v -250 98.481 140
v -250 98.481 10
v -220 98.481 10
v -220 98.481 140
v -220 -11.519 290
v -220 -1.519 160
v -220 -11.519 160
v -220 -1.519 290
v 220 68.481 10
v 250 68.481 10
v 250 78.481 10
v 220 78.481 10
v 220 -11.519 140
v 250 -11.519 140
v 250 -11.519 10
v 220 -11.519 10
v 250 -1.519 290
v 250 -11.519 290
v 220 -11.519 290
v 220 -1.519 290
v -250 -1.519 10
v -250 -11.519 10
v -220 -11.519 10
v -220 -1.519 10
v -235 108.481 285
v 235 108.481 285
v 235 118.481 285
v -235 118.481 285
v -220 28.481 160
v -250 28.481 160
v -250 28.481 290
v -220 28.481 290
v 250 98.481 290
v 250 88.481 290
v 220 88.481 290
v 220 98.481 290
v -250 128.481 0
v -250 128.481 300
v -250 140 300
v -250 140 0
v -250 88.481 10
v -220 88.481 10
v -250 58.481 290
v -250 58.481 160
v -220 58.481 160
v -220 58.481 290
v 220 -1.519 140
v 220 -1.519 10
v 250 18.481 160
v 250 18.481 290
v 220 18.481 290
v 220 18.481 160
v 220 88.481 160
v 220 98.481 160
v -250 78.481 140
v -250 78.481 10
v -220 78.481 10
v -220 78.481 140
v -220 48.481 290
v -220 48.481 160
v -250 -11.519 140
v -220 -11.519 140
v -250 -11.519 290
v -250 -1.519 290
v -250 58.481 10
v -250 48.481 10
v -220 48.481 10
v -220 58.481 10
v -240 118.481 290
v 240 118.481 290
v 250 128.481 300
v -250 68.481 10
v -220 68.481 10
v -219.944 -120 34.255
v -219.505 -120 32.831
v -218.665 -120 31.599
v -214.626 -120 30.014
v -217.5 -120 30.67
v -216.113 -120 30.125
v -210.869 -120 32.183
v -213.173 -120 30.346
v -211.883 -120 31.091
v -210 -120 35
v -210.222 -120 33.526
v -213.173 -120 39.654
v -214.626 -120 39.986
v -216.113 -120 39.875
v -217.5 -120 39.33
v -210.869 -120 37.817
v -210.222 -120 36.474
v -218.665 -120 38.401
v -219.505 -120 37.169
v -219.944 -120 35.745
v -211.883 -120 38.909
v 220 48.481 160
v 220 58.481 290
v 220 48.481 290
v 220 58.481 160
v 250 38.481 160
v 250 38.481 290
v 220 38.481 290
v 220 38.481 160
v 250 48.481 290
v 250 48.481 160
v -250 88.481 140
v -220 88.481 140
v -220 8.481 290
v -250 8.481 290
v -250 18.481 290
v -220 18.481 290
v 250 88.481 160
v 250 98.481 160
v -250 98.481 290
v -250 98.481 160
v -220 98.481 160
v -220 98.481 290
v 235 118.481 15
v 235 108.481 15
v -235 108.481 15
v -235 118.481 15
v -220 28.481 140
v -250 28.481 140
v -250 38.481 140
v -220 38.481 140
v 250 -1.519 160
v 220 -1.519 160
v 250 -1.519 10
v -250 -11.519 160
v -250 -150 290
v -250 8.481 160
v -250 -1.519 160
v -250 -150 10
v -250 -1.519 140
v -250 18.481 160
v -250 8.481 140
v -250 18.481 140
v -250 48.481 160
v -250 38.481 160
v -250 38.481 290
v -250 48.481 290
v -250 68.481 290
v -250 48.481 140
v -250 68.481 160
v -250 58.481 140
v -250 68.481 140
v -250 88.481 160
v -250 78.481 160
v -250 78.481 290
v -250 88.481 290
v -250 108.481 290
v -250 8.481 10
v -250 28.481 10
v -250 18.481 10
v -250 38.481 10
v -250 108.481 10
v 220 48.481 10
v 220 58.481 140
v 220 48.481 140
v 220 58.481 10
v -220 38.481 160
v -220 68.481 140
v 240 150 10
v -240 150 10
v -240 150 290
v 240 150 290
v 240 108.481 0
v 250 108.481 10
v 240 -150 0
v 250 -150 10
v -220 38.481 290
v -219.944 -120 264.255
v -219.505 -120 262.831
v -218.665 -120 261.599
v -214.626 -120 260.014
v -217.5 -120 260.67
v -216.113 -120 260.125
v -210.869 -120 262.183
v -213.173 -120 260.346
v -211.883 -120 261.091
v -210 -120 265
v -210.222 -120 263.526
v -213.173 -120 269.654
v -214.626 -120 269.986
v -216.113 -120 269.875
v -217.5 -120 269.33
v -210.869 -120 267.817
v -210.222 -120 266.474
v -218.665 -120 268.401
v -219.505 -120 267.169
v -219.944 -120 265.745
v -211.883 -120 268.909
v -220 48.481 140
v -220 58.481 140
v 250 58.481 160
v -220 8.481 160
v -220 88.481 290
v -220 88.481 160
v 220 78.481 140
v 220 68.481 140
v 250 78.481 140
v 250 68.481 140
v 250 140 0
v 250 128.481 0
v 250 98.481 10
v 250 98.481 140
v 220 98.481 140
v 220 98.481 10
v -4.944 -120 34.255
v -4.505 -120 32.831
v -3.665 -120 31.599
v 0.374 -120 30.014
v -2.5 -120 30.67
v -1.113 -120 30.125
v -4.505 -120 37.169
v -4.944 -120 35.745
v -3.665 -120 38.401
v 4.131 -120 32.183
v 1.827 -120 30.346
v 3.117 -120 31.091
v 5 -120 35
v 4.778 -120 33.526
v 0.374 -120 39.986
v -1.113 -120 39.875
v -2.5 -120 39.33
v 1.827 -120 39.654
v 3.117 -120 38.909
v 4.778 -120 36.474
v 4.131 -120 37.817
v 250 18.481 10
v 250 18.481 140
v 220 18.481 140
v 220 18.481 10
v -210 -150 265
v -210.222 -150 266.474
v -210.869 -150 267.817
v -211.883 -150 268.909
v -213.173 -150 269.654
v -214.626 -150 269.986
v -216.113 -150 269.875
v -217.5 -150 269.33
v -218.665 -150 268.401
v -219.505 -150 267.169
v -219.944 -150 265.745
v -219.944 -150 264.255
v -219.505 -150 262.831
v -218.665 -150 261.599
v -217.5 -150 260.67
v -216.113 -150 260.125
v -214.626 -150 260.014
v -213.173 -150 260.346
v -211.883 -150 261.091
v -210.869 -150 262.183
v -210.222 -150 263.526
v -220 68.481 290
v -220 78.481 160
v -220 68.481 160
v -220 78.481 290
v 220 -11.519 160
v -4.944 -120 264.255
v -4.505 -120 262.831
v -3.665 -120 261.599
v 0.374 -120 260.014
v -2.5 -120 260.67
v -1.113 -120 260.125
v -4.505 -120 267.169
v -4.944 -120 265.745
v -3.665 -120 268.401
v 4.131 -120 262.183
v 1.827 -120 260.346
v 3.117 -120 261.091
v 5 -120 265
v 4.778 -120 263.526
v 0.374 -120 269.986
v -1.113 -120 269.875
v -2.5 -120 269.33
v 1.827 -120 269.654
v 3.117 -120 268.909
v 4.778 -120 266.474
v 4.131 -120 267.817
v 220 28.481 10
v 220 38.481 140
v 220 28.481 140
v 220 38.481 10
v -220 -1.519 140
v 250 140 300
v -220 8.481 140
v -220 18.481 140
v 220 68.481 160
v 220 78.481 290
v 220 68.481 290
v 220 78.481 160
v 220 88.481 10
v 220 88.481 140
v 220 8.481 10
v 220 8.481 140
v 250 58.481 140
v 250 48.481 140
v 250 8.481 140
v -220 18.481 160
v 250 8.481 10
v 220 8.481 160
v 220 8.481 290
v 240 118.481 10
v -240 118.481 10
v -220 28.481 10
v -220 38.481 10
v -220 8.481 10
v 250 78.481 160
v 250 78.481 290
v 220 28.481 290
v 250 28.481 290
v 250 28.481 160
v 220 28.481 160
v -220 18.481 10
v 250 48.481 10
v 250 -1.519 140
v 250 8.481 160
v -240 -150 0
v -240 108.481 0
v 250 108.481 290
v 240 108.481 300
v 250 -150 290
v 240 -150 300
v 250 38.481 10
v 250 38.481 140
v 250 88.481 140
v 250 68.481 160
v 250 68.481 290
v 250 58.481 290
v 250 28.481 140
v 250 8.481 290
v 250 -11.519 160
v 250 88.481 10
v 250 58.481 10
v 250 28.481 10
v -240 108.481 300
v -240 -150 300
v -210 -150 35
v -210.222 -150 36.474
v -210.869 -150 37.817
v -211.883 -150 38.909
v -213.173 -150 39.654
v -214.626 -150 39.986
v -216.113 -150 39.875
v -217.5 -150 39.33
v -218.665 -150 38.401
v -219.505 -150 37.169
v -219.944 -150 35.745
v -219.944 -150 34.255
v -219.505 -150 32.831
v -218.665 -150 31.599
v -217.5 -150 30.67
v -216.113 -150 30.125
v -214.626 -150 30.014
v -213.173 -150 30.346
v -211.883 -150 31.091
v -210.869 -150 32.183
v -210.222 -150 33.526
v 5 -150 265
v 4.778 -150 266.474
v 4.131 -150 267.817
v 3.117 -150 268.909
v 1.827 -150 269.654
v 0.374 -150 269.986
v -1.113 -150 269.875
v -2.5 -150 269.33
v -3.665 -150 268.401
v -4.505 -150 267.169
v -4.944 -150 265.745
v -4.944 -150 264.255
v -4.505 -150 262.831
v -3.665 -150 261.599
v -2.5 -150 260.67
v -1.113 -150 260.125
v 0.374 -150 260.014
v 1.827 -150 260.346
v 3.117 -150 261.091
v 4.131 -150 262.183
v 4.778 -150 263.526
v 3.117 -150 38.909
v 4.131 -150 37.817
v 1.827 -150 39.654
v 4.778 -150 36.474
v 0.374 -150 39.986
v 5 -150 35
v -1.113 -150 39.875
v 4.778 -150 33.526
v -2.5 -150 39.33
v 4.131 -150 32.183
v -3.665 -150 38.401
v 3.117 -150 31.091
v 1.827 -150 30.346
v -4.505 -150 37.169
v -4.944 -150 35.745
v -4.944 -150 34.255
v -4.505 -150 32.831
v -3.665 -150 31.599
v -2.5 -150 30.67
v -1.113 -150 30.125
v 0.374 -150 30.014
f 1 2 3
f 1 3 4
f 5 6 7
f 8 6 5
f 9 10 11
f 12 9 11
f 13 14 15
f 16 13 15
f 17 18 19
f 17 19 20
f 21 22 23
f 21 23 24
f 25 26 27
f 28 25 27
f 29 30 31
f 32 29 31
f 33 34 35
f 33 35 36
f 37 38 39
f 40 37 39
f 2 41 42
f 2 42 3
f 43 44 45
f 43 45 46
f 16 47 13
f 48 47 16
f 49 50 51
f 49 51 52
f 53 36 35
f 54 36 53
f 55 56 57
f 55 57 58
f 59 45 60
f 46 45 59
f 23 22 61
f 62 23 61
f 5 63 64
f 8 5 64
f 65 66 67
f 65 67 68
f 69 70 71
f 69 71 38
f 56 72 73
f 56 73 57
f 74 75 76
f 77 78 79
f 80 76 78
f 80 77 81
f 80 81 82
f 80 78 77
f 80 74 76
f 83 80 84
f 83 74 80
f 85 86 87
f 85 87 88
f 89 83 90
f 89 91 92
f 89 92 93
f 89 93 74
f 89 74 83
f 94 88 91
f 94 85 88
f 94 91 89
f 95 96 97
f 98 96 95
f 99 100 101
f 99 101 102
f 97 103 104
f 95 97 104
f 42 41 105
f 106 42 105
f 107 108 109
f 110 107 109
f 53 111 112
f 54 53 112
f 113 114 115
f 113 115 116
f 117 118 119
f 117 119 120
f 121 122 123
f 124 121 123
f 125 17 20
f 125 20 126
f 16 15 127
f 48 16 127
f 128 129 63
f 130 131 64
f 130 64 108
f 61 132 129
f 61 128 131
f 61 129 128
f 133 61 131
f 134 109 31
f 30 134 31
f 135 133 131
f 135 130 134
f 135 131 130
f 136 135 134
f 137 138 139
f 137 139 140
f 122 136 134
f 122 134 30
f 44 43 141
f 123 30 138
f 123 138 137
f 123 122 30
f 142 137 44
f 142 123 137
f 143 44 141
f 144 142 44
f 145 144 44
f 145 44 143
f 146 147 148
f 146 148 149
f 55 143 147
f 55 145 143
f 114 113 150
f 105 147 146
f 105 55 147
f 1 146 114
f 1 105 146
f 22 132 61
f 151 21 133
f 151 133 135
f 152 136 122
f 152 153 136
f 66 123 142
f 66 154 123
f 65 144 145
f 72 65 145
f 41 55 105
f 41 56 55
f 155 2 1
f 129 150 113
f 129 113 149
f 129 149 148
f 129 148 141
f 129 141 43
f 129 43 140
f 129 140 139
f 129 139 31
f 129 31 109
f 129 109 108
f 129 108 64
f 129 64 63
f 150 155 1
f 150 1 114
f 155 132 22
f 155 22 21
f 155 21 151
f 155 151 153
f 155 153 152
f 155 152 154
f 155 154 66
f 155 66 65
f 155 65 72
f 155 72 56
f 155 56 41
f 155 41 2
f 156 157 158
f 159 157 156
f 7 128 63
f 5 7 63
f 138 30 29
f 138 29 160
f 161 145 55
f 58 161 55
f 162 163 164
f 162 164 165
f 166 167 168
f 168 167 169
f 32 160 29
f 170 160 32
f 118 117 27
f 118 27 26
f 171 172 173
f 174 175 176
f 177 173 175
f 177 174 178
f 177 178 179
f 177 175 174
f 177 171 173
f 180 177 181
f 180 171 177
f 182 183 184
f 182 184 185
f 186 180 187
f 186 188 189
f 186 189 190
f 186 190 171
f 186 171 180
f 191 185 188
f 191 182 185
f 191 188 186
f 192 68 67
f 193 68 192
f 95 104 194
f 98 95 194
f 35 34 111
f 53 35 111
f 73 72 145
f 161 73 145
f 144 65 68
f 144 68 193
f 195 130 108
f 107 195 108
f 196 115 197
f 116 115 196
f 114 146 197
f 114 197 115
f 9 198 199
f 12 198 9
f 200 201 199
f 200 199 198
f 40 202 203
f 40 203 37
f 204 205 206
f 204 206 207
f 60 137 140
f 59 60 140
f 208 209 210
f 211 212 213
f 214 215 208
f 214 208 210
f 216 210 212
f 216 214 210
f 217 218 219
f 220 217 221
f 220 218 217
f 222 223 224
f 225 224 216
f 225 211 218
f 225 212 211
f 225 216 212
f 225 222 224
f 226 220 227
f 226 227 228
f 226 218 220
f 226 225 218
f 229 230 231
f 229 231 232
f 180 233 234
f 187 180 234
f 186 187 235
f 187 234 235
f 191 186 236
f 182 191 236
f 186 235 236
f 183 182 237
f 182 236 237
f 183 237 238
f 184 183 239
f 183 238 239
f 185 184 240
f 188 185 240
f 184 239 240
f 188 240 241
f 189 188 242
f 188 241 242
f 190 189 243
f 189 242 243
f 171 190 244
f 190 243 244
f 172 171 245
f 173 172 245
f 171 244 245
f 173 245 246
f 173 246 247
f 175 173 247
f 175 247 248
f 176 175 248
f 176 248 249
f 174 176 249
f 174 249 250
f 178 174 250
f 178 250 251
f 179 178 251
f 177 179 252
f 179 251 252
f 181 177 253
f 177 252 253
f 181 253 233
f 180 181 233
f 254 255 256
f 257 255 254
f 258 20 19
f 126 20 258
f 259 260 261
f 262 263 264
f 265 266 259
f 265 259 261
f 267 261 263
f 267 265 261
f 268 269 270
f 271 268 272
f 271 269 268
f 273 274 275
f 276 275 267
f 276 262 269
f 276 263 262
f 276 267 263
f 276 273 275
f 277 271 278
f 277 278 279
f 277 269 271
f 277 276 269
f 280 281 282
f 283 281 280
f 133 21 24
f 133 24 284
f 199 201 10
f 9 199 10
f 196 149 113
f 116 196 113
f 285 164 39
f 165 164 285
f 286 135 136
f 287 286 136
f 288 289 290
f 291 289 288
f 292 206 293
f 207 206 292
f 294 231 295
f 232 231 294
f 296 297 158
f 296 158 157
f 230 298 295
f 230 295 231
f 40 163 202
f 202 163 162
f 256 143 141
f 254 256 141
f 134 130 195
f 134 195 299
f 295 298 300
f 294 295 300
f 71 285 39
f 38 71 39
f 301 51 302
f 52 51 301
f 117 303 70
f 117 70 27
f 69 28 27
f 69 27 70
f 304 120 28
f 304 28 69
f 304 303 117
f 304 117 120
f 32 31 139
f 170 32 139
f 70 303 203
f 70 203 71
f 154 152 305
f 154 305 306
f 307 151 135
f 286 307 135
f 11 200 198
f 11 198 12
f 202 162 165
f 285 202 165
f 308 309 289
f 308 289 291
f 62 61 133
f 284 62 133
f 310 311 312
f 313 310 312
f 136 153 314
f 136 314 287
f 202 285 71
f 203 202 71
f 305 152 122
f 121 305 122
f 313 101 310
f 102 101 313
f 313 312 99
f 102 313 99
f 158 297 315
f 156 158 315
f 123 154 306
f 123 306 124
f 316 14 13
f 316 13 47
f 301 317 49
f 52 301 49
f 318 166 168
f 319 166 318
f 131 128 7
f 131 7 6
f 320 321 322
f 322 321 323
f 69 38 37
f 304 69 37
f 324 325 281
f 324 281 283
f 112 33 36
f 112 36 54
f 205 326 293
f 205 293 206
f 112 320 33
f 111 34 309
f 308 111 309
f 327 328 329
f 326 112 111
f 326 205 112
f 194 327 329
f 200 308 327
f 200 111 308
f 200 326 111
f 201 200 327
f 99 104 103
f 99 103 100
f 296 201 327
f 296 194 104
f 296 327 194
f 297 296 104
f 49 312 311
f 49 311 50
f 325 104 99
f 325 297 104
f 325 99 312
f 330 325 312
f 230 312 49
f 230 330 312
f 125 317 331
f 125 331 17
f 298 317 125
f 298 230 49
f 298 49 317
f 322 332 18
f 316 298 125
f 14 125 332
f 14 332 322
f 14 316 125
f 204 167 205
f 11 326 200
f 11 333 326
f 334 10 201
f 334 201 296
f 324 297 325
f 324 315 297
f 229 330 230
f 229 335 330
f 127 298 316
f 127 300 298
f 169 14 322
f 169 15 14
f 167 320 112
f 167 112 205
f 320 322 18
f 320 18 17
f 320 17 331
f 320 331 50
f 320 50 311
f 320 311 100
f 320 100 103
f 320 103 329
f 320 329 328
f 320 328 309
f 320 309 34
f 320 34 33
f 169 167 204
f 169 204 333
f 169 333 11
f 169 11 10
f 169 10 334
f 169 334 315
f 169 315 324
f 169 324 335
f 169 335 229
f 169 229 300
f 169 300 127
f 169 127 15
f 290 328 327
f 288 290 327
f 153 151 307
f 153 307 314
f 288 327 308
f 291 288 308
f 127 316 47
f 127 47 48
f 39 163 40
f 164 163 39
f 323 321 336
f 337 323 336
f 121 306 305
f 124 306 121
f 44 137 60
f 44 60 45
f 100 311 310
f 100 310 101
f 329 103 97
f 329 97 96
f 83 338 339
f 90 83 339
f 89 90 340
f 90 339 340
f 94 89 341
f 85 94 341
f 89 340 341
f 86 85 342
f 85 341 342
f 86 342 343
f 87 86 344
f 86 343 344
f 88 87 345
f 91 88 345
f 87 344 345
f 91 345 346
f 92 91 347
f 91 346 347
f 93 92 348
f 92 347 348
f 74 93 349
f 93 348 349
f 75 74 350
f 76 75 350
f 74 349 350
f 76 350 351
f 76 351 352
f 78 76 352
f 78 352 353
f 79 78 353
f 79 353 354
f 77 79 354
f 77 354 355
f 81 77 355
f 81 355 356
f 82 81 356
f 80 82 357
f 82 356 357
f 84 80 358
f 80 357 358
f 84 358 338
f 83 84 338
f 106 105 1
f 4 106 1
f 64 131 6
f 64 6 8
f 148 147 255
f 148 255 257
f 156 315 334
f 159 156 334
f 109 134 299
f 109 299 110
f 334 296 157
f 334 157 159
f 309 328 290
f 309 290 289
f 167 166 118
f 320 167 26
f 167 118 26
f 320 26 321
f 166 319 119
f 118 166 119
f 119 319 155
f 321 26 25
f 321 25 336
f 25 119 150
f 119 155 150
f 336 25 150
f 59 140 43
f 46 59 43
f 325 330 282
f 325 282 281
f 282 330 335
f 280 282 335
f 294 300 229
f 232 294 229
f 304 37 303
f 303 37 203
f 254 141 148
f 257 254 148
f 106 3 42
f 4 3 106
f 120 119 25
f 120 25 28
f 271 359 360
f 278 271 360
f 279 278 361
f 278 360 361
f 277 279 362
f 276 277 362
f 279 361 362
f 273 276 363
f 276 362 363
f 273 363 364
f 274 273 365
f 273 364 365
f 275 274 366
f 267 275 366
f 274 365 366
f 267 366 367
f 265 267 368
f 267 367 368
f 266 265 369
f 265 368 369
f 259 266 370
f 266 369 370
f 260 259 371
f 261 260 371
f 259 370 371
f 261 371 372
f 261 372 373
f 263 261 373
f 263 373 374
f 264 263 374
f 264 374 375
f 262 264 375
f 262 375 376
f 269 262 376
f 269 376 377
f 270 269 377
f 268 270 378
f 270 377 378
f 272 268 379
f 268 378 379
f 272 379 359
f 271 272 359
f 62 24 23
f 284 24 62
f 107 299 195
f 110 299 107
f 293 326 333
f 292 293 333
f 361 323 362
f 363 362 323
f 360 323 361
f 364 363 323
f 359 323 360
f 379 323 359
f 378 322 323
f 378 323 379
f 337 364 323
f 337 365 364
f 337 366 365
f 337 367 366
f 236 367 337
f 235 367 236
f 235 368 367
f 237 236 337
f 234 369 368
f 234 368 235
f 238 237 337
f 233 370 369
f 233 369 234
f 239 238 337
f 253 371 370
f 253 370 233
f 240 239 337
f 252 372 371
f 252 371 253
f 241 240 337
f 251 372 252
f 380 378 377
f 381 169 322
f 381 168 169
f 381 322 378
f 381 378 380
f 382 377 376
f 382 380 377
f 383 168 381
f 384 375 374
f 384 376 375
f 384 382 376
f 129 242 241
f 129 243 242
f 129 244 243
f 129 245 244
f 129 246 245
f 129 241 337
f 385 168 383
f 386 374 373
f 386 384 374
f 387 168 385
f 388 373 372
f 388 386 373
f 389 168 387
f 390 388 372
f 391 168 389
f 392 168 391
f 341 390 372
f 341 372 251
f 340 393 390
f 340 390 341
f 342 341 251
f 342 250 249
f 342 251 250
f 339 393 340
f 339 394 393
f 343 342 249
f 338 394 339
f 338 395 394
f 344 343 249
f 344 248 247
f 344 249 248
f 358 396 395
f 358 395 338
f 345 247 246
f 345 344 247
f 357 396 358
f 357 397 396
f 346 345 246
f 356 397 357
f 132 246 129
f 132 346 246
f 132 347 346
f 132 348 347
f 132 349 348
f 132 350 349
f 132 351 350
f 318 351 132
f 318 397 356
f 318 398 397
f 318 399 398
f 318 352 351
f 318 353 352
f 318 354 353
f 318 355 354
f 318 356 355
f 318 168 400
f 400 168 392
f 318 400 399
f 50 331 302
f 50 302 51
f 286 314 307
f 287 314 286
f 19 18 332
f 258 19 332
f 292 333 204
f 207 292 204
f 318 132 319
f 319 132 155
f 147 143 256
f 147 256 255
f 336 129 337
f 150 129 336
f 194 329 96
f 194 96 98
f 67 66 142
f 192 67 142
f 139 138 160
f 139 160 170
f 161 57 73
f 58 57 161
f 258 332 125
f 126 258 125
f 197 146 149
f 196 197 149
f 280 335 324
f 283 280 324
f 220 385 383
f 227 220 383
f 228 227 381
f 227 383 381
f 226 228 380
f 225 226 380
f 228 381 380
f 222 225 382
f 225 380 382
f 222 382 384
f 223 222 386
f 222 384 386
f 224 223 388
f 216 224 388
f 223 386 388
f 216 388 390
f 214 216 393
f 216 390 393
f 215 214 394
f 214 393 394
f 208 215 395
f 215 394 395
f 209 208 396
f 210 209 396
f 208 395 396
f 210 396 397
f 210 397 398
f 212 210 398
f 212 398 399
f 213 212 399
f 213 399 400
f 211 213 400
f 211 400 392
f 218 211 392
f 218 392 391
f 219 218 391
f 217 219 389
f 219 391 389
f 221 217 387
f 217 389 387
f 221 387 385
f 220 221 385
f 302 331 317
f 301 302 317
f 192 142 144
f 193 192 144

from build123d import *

# Parameters (mm, degrees)
BOSS_EXTRUDE1_DEPTH = 300
SKETCH2_W           = 15
SKETCH2_H           = 10
CUT_EXTRUDE1_DEPTH  = 603.07972894
SKETCH4_W           = 130
SKETCH4_H           = 10
CUT_EXTRUDE2_DEPTH  = 30
SKETCH7_W           = 130
SKETCH7_H           = 10
CUT_EXTRUDE3_DEPTH  = 30
CHAMFER1_SIZE       = 10
CHAMFER2_SIZE       = 10
CHAMFER3_SIZE       = 10
SKETCH8_R           = 5
CUT_EXTRUDE4_DEPTH  = 30


with BuildPart() as part:
    # Sketch1 → Boss-Extrude1 (new body)
    with BuildSketch(Plane.XY):
        Polygon((250, 118.480565371), (235, 118.480565371), (235, 108.480565371), (250, 108.480565371), (250, -150), (-250, -150), (-250, 108.480565371), (-235, 108.480565371), (-235, 118.480565371), (-250, 118.480565371), (-250, 150), (250, 150), align=None)
    extrude(amount=BOSS_EXTRUDE1_DEPTH)

    # Sketch2 → Cut-Extrude1 (cut, through all)
    with BuildSketch(Plane.ZY.offset(250)):
        with Locations((292.5, 113.480565371)):
            Rectangle(SKETCH2_W, SKETCH2_H)
        with Locations((7.5, 113.480565371)):
            Rectangle(SKETCH2_W, SKETCH2_H)
    extrude(amount=-CUT_EXTRUDE1_DEPTH, mode=Mode.SUBTRACT)

    # Sketch4 → Cut-Extrude2 (cut)
    with BuildSketch(Plane.ZY.offset(250)):
        with Locations((75, 93.480565371)):
            Rectangle(SKETCH4_W, SKETCH4_H)
        with Locations((225, 93.480565371)):
            Rectangle(SKETCH4_W, SKETCH4_H)
        with Locations((225, 73.480565371)):
            Rectangle(SKETCH4_W, SKETCH4_H)
        with Locations((225, 53.480565371)):
            Rectangle(SKETCH4_W, SKETCH4_H)
        with Locations((225, 33.480565371)):
            Rectangle(SKETCH4_W, SKETCH4_H)
        with Locations((225, 13.480565371)):
            Rectangle(SKETCH4_W, SKETCH4_H)
        with Locations((225, -6.519434629)):
            Rectangle(SKETCH4_W, SKETCH4_H)
        with Locations((75, 73.480565371)):
            Rectangle(SKETCH4_W, SKETCH4_H)
        with Locations((75, 53.480565371)):
            Rectangle(SKETCH4_W, SKETCH4_H)
        with Locations((75, 33.480565371)):
            Rectangle(SKETCH4_W, SKETCH4_H)
        with Locations((75, 13.480565371)):
            Rectangle(SKETCH4_W, SKETCH4_H)
        with Locations((75, -6.519434629)):
            Rectangle(SKETCH4_W, SKETCH4_H)
    extrude(amount=-CUT_EXTRUDE2_DEPTH, mode=Mode.SUBTRACT)

    # Sketch7 → Cut-Extrude3 (cut)
    with BuildSketch(Plane(origin=(250, 0, 0), x_dir=(0, 0, -1), z_dir=(1, 0, 0))):
        with Locations((-225, 93.480565371)):
            Rectangle(SKETCH7_W, SKETCH7_H)
        with Locations((-75, 93.480565371)):
            Rectangle(SKETCH7_W, SKETCH7_H)
        with Locations((-75, 73.480565371)):
            Rectangle(SKETCH7_W, SKETCH7_H)
        with Locations((-75, 53.480565371)):
            Rectangle(SKETCH7_W, SKETCH7_H)
        with Locations((-75, 33.480565371)):
            Rectangle(SKETCH7_W, SKETCH7_H)
        with Locations((-75, 13.480565371)):
            Rectangle(SKETCH7_W, SKETCH7_H)
        with Locations((-75, -6.519434629)):
            Rectangle(SKETCH7_W, SKETCH7_H)
        with Locations((-225, 73.480565371)):
            Rectangle(SKETCH7_W, SKETCH7_H)
        with Locations((-225, 53.480565371)):
            Rectangle(SKETCH7_W, SKETCH7_H)
        with Locations((-225, 33.480565371)):
            Rectangle(SKETCH7_W, SKETCH7_H)
        with Locations((-225, 13.480565371)):
            Rectangle(SKETCH7_W, SKETCH7_H)
        with Locations((-225, -6.519434629)):
            Rectangle(SKETCH7_W, SKETCH7_H)
    extrude(amount=-CUT_EXTRUDE3_DEPTH, mode=Mode.SUBTRACT)

    # Chamfer1
    chamfer1_edges = [part.edges().sort_by_distance(p)[0] for p in [
        (0, 150, 0),
        (-250, 150, 150),
        (250, 150, 150),
        (0, 150, 300),
    ]]
    chamfer(chamfer1_edges, length=CHAMFER1_SIZE)

    # Chamfer2
    chamfer2_edges = [part.edges().sort_by_distance(p)[0] for p in [
        (0, 118.480565371, 0),
        (-250, 118.480565371, 150),
        (250, 118.480565371, 150),
        (0, 118.480565371, 300),
    ]]
    chamfer(chamfer2_edges, length=CHAMFER2_SIZE)

    # Chamfer3
    chamfer3_edges = [part.edges().sort_by_distance(p)[0] for p in [
        (250, -20.759717314, 300),
        (250, -20.759717314, 0),
        (-250, -20.759717314, 0),
        (-250, -20.759717314, 300),
    ]]
    chamfer(chamfer3_edges, length=CHAMFER3_SIZE - 0.0001)  # a hair under: the kernel refuses the full size

    # Sketch8 → Cut-Extrude4 (cut)
    with BuildSketch(Plane.XZ.offset(150)):
        with Locations((-215, 35)):
            Circle(SKETCH8_R)
        with Locations((-215, 265)):
            Circle(SKETCH8_R)
        with Locations((0, 265)):
            Circle(SKETCH8_R)
        with Locations((0, 35)):
            Circle(SKETCH8_R)
    extrude(amount=-CUT_EXTRUDE4_DEPTH, mode=Mode.SUBTRACT)


solid = part.part
